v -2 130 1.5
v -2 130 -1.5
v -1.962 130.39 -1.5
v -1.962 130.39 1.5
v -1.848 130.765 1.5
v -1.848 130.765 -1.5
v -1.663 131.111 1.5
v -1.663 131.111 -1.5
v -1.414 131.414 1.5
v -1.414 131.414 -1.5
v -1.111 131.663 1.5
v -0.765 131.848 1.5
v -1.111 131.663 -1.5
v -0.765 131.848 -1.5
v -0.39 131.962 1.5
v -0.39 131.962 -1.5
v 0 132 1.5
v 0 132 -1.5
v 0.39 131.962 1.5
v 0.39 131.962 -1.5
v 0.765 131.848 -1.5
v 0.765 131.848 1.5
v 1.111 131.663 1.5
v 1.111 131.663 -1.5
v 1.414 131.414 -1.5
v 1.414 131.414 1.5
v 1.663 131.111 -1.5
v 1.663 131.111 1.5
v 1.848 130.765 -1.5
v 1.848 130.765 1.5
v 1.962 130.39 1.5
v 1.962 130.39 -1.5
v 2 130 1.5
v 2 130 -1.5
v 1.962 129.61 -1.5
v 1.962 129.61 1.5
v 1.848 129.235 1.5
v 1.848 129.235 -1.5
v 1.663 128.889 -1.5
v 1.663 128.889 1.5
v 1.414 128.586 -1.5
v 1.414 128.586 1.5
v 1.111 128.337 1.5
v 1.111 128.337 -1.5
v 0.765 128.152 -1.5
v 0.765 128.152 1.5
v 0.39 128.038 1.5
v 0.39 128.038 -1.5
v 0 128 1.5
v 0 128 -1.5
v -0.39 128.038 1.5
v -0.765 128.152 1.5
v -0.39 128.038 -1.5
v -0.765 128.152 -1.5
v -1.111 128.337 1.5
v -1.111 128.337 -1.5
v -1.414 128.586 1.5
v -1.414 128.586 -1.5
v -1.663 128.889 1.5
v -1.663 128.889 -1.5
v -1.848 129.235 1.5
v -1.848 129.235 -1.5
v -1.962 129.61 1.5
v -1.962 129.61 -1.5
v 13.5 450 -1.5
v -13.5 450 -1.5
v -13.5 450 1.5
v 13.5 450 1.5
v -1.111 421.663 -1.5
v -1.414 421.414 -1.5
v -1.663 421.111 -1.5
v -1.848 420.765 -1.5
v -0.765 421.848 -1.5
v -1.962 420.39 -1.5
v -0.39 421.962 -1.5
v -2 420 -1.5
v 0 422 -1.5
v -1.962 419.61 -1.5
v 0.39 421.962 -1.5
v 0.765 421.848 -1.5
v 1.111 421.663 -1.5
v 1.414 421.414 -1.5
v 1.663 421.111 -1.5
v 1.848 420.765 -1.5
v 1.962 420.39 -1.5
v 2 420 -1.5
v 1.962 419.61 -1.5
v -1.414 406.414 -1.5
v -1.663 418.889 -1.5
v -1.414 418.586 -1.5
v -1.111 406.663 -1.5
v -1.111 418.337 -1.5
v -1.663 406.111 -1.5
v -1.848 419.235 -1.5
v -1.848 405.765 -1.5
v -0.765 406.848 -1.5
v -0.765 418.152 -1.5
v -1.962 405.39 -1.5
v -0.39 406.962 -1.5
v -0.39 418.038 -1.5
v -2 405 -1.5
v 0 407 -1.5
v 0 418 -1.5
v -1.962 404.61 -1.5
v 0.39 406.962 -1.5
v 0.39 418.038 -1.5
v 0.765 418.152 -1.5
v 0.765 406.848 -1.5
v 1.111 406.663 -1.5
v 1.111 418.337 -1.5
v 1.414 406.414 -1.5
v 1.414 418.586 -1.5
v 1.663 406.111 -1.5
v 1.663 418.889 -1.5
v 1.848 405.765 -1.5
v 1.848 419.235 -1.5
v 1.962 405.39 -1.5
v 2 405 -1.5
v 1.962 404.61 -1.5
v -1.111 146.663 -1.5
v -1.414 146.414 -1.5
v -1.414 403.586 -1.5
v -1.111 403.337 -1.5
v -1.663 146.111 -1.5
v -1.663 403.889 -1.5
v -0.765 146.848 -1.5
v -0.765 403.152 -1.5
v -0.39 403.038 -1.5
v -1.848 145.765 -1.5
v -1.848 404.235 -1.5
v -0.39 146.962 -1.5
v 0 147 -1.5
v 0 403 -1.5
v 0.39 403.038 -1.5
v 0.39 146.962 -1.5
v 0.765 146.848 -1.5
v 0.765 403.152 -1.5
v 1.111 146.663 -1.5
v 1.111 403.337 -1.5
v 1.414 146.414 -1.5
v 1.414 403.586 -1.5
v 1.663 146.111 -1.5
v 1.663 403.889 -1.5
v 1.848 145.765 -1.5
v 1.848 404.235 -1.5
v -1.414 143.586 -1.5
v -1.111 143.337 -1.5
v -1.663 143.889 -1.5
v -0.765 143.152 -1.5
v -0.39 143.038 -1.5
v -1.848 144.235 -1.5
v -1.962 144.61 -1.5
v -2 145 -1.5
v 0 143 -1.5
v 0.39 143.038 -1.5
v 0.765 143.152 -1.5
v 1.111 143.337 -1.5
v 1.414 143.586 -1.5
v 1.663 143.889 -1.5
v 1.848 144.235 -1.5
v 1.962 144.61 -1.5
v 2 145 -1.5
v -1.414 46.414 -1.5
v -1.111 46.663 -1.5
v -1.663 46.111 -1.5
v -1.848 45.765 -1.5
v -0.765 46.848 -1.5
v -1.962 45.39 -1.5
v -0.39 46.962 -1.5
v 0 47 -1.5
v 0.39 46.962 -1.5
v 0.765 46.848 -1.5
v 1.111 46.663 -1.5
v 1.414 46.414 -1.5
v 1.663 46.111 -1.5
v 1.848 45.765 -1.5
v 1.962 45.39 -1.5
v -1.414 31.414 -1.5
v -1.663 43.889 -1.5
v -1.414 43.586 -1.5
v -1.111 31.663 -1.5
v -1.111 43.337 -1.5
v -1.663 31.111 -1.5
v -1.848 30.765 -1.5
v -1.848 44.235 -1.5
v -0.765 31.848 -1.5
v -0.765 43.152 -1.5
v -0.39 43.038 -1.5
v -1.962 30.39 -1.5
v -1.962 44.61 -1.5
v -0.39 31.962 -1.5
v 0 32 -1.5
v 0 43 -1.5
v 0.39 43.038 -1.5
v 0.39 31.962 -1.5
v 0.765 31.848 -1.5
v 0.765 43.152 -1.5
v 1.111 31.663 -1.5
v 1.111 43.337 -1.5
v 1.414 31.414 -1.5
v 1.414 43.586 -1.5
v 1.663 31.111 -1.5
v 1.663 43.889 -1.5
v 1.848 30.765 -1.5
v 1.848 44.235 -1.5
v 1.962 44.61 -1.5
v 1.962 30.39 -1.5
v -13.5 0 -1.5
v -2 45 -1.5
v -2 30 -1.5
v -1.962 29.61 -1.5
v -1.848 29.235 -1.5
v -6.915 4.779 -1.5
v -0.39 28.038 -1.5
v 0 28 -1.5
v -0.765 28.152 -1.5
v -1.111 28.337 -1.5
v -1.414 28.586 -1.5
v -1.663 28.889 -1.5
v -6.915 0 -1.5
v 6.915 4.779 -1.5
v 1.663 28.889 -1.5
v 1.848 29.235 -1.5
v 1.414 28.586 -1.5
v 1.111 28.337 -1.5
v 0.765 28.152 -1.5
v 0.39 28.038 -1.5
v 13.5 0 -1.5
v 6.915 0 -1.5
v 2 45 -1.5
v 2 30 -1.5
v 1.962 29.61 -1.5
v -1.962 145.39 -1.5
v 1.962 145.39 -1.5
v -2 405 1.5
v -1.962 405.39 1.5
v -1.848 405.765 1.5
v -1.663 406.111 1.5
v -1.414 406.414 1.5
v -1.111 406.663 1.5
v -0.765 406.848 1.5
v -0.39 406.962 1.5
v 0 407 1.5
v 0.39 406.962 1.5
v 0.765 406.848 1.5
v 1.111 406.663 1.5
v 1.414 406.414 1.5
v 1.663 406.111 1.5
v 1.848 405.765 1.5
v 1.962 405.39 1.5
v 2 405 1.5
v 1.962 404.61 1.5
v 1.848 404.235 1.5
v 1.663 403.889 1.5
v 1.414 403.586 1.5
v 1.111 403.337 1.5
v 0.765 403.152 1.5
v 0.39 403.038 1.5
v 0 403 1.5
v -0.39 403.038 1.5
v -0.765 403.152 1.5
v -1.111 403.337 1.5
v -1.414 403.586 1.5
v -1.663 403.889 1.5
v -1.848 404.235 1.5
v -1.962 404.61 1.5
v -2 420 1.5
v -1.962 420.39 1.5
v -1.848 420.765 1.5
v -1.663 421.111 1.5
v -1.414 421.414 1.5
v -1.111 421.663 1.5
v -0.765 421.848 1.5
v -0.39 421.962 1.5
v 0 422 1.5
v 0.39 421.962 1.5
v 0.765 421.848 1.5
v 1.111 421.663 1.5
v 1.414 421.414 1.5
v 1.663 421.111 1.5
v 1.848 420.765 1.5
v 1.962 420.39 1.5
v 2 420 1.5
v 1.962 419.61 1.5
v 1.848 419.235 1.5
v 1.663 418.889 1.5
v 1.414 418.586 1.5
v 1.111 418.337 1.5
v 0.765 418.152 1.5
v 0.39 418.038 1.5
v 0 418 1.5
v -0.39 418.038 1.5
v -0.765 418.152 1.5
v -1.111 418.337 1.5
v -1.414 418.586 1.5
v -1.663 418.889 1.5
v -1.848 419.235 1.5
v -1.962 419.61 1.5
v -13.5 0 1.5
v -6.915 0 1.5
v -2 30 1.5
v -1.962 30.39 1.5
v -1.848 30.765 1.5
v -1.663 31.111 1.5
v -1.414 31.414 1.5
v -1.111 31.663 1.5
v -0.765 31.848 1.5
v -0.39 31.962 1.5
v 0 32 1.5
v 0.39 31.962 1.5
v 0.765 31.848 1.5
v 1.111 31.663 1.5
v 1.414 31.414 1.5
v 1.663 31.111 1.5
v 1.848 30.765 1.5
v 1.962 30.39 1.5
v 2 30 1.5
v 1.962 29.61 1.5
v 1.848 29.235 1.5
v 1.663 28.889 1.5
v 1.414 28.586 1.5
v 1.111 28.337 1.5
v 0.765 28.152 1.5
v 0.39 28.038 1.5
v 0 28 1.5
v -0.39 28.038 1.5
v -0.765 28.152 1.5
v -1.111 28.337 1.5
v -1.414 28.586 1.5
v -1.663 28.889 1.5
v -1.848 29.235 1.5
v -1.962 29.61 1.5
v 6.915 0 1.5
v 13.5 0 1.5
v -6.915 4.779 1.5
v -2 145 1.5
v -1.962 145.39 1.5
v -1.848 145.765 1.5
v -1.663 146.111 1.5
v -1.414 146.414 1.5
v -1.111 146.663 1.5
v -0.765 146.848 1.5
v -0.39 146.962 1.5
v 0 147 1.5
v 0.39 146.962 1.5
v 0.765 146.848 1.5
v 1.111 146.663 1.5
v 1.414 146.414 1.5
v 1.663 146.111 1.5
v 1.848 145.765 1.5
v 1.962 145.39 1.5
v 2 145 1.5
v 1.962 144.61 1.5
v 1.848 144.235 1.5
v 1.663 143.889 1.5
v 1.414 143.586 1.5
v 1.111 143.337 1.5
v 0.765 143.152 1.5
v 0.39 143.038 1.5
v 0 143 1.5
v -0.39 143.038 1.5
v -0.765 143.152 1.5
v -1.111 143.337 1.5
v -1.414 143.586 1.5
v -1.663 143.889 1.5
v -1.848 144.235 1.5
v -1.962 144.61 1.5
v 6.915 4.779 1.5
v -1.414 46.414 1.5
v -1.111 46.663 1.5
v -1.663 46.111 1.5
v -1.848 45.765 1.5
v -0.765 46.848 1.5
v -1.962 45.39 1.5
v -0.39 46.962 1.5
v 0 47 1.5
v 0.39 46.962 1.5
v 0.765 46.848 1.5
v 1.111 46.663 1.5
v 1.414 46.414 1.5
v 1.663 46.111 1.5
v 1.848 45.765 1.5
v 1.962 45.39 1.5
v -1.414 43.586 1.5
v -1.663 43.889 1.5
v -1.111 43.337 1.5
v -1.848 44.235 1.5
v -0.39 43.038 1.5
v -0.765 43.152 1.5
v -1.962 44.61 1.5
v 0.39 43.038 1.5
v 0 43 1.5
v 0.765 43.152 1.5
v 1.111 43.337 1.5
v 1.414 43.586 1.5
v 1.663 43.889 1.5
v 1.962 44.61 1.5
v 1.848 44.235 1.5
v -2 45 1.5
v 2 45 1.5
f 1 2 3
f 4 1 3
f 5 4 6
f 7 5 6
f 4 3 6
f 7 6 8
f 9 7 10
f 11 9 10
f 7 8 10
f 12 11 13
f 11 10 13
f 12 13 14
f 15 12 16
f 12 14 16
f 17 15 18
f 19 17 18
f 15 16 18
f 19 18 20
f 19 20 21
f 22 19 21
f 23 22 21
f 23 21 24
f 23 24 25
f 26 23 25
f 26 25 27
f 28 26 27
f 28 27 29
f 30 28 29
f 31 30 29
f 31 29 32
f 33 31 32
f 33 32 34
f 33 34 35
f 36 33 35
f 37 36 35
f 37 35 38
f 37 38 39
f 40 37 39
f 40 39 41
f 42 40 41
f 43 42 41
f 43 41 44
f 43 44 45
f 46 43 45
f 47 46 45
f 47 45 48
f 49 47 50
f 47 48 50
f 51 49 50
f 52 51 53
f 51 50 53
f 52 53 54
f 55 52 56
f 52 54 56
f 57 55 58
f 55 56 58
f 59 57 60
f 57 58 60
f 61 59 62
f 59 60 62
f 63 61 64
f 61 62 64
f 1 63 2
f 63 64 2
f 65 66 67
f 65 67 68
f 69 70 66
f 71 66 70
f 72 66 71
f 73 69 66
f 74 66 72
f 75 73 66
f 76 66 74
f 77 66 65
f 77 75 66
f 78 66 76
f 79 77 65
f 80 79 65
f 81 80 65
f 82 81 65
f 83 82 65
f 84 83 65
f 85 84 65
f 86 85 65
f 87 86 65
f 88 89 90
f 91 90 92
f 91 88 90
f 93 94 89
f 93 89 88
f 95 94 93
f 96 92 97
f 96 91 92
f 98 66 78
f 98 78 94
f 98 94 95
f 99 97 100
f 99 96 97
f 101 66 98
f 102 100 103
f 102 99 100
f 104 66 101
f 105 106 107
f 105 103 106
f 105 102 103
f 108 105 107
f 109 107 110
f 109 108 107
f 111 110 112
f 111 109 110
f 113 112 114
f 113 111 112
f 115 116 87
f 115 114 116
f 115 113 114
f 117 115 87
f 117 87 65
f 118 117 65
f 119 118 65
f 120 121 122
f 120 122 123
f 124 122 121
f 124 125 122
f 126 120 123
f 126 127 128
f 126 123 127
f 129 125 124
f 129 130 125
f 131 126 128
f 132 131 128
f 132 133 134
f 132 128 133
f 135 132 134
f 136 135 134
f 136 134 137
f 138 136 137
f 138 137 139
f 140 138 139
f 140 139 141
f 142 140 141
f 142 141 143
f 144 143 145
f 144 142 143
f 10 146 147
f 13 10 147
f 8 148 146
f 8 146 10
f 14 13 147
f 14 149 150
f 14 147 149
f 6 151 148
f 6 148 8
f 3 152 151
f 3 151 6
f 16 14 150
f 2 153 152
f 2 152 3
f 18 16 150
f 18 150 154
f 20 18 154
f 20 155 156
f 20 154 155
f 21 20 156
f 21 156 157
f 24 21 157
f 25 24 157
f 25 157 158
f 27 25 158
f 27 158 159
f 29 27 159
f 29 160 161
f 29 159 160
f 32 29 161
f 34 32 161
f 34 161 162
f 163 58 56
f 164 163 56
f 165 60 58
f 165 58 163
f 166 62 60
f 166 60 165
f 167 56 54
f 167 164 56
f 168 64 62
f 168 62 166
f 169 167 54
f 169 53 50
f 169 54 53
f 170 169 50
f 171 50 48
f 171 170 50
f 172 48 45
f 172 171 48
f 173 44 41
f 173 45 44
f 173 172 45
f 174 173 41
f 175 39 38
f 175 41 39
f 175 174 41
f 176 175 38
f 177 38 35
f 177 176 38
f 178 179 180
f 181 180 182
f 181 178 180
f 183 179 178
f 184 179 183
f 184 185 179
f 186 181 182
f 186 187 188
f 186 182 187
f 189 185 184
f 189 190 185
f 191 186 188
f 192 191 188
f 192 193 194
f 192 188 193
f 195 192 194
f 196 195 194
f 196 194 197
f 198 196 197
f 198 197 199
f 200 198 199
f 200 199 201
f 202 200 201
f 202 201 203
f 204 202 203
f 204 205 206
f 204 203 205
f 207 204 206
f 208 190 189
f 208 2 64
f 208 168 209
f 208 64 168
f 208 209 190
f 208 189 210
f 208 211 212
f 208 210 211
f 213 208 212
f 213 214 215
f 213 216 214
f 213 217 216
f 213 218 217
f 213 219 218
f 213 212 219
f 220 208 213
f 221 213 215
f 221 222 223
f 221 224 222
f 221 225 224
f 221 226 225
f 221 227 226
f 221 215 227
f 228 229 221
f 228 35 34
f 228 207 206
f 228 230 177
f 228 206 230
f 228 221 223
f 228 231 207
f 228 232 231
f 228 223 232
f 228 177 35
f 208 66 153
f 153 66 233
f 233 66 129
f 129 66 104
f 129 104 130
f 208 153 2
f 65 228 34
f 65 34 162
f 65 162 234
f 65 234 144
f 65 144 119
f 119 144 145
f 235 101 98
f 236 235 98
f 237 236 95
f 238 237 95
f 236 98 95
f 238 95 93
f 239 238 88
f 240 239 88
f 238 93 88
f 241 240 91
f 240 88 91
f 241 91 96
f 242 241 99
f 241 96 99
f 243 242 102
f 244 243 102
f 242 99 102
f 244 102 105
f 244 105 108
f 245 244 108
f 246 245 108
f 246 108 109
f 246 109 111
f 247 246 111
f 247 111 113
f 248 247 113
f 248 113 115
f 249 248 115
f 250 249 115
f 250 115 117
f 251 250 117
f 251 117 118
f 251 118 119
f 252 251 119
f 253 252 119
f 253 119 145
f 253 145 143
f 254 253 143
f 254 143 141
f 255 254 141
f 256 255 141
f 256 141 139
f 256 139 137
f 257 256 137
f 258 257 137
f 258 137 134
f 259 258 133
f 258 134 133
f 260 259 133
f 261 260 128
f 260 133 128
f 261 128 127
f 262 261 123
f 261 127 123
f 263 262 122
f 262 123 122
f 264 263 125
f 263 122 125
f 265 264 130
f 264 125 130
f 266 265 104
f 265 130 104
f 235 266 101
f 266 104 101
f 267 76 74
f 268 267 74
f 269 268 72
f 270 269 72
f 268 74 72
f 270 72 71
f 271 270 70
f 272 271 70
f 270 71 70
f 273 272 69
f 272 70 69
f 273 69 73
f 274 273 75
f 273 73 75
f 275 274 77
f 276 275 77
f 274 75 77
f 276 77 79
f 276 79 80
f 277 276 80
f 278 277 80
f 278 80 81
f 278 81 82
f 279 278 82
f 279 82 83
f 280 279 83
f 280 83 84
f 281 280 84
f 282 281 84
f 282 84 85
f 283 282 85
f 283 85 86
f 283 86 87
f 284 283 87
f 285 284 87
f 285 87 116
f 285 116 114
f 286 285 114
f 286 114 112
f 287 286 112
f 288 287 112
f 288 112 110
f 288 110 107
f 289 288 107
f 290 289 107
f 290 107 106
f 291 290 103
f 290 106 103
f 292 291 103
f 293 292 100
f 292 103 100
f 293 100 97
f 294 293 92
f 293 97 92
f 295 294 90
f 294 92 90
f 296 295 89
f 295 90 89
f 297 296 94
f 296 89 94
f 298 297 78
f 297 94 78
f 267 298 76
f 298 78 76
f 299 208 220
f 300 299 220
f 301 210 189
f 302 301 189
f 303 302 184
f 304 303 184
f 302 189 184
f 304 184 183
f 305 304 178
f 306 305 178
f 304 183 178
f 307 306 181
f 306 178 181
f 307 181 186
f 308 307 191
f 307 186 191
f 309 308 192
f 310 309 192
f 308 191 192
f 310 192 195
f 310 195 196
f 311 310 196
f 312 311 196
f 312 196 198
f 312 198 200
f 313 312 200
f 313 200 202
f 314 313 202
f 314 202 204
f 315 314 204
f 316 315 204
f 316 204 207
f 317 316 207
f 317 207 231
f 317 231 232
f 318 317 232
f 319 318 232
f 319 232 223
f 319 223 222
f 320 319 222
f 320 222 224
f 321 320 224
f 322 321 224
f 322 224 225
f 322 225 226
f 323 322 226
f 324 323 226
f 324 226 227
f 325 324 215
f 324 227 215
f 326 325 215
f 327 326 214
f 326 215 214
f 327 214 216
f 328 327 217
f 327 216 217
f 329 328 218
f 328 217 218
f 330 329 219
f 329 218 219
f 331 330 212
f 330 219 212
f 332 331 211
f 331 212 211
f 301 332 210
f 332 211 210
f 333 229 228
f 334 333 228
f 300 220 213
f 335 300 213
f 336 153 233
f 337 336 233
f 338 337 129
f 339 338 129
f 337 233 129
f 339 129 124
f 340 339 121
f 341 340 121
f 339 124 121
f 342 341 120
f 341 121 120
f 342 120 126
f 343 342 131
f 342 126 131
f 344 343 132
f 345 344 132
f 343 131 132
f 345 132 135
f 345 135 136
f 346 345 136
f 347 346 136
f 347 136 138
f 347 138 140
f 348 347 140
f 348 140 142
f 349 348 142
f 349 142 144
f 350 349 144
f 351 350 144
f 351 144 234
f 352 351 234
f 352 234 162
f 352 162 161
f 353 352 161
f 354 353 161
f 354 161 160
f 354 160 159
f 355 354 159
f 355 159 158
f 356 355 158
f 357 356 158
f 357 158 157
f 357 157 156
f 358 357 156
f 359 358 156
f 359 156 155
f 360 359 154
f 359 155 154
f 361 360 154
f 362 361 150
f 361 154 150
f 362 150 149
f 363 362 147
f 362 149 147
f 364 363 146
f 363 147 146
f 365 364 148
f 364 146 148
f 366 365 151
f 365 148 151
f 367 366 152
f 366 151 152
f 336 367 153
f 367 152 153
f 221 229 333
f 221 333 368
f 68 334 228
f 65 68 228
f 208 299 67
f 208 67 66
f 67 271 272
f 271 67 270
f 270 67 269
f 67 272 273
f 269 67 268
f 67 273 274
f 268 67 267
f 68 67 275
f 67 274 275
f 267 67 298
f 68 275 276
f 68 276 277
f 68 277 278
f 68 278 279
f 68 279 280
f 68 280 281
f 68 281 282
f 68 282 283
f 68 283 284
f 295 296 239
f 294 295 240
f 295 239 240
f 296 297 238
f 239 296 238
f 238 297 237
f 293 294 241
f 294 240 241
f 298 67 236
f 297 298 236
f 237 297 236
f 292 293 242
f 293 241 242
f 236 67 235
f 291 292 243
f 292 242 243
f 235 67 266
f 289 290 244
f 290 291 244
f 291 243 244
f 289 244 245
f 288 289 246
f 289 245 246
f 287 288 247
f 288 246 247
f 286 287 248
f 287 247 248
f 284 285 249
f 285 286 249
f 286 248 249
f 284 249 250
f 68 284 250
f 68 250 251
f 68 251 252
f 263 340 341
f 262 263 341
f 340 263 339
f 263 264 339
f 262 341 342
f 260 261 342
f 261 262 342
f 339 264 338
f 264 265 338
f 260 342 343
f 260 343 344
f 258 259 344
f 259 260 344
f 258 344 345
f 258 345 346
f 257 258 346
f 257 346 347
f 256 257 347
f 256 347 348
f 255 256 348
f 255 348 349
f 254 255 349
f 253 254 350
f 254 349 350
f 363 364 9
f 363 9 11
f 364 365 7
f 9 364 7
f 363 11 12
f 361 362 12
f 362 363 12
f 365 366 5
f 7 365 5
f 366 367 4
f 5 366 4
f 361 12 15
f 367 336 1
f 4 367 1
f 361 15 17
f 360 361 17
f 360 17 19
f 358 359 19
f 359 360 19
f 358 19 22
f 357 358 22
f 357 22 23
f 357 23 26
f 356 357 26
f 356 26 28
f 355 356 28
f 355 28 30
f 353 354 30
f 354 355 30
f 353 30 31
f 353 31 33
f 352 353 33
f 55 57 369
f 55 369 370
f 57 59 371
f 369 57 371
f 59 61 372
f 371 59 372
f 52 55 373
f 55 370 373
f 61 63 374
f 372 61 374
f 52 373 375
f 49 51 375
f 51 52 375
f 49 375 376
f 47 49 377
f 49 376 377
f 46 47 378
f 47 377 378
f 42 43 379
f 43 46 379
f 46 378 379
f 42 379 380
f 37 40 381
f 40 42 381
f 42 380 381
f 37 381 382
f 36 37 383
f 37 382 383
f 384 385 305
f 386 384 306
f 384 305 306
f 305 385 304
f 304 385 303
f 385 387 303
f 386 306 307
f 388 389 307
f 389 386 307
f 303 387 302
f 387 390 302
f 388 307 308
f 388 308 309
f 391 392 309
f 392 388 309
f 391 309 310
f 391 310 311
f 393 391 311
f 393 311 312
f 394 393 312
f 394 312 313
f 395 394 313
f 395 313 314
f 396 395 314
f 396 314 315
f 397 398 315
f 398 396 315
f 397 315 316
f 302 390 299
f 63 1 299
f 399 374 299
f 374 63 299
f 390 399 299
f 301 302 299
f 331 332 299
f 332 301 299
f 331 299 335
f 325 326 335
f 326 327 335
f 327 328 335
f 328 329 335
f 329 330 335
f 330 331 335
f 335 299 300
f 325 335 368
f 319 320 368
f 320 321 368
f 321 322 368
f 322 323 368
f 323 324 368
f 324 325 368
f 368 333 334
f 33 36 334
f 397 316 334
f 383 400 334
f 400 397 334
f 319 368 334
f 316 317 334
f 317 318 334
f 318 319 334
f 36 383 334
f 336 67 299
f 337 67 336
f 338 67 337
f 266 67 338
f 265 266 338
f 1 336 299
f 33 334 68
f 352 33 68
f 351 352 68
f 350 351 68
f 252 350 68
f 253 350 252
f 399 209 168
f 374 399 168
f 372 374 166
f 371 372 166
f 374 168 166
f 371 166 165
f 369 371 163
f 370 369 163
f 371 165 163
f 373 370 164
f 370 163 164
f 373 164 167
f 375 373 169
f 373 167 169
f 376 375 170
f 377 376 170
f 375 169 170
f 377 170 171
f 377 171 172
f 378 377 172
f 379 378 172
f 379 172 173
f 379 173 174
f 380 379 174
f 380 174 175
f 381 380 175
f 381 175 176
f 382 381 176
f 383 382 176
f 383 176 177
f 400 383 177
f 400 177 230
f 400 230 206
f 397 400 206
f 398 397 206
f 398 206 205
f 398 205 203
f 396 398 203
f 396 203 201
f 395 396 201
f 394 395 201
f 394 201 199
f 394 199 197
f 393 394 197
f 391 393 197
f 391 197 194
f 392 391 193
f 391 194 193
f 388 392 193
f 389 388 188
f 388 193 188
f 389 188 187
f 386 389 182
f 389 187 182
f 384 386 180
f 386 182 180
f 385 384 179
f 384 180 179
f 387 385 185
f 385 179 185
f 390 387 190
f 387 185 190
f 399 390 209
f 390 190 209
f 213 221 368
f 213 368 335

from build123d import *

# Parameters (mm, degrees)
SKETCH_1_W          = 27
SKETCH_1_H          = 3
EXTRUDE_1_DEPTH     = 450
SKETCH_2_W          = 13.830635844
SKETCH_2_H          = 9.55824336
CUT_EXTRUDE_1_DEPTH = 4
SKETCH_3_R          = 2
CUT_EXTRUDE_2_DEPTH = 4


with BuildPart() as part:
    # 草图1 → 凸台-拉伸1 (new body)
    with BuildSketch(Plane(origin=(0, 0, 0), x_dir=(1, 0, 0), z_dir=(0, 1, 0))):
        Rectangle(SKETCH_1_W, SKETCH_1_H)
    extrude(amount=EXTRUDE_1_DEPTH)

    # 草图2 → 切除-拉伸1 (cut, through all)
    with BuildSketch(Plane(origin=(0, 0, -1.5), x_dir=(-1, 0, 0), z_dir=(0, 0, -1))):
        Rectangle(SKETCH_2_W, SKETCH_2_H)
    extrude(amount=-CUT_EXTRUDE_1_DEPTH, mode=Mode.SUBTRACT)

    # 草图3 → 切除-拉伸2 (cut, through all)
    with BuildSketch(Plane(origin=(0, 0, -1.5), x_dir=(-1, 0, 0), z_dir=(0, 0, -1))):
        with Locations((0, 420)):
            Circle(SKETCH_3_R)
        with Locations((0, 405)):
            Circle(SKETCH_3_R)
        with Locations((0, 30)):
            Circle(SKETCH_3_R)
        with Locations((0, 45)):
            Circle(SKETCH_3_R)
        with Locations((0, 130)):
            Circle(SKETCH_3_R)
        with Locations((0, 145)):
            Circle(SKETCH_3_R)
    extrude(amount=-CUT_EXTRUDE_2_DEPTH, mode=Mode.SUBTRACT)


solid = part.part
